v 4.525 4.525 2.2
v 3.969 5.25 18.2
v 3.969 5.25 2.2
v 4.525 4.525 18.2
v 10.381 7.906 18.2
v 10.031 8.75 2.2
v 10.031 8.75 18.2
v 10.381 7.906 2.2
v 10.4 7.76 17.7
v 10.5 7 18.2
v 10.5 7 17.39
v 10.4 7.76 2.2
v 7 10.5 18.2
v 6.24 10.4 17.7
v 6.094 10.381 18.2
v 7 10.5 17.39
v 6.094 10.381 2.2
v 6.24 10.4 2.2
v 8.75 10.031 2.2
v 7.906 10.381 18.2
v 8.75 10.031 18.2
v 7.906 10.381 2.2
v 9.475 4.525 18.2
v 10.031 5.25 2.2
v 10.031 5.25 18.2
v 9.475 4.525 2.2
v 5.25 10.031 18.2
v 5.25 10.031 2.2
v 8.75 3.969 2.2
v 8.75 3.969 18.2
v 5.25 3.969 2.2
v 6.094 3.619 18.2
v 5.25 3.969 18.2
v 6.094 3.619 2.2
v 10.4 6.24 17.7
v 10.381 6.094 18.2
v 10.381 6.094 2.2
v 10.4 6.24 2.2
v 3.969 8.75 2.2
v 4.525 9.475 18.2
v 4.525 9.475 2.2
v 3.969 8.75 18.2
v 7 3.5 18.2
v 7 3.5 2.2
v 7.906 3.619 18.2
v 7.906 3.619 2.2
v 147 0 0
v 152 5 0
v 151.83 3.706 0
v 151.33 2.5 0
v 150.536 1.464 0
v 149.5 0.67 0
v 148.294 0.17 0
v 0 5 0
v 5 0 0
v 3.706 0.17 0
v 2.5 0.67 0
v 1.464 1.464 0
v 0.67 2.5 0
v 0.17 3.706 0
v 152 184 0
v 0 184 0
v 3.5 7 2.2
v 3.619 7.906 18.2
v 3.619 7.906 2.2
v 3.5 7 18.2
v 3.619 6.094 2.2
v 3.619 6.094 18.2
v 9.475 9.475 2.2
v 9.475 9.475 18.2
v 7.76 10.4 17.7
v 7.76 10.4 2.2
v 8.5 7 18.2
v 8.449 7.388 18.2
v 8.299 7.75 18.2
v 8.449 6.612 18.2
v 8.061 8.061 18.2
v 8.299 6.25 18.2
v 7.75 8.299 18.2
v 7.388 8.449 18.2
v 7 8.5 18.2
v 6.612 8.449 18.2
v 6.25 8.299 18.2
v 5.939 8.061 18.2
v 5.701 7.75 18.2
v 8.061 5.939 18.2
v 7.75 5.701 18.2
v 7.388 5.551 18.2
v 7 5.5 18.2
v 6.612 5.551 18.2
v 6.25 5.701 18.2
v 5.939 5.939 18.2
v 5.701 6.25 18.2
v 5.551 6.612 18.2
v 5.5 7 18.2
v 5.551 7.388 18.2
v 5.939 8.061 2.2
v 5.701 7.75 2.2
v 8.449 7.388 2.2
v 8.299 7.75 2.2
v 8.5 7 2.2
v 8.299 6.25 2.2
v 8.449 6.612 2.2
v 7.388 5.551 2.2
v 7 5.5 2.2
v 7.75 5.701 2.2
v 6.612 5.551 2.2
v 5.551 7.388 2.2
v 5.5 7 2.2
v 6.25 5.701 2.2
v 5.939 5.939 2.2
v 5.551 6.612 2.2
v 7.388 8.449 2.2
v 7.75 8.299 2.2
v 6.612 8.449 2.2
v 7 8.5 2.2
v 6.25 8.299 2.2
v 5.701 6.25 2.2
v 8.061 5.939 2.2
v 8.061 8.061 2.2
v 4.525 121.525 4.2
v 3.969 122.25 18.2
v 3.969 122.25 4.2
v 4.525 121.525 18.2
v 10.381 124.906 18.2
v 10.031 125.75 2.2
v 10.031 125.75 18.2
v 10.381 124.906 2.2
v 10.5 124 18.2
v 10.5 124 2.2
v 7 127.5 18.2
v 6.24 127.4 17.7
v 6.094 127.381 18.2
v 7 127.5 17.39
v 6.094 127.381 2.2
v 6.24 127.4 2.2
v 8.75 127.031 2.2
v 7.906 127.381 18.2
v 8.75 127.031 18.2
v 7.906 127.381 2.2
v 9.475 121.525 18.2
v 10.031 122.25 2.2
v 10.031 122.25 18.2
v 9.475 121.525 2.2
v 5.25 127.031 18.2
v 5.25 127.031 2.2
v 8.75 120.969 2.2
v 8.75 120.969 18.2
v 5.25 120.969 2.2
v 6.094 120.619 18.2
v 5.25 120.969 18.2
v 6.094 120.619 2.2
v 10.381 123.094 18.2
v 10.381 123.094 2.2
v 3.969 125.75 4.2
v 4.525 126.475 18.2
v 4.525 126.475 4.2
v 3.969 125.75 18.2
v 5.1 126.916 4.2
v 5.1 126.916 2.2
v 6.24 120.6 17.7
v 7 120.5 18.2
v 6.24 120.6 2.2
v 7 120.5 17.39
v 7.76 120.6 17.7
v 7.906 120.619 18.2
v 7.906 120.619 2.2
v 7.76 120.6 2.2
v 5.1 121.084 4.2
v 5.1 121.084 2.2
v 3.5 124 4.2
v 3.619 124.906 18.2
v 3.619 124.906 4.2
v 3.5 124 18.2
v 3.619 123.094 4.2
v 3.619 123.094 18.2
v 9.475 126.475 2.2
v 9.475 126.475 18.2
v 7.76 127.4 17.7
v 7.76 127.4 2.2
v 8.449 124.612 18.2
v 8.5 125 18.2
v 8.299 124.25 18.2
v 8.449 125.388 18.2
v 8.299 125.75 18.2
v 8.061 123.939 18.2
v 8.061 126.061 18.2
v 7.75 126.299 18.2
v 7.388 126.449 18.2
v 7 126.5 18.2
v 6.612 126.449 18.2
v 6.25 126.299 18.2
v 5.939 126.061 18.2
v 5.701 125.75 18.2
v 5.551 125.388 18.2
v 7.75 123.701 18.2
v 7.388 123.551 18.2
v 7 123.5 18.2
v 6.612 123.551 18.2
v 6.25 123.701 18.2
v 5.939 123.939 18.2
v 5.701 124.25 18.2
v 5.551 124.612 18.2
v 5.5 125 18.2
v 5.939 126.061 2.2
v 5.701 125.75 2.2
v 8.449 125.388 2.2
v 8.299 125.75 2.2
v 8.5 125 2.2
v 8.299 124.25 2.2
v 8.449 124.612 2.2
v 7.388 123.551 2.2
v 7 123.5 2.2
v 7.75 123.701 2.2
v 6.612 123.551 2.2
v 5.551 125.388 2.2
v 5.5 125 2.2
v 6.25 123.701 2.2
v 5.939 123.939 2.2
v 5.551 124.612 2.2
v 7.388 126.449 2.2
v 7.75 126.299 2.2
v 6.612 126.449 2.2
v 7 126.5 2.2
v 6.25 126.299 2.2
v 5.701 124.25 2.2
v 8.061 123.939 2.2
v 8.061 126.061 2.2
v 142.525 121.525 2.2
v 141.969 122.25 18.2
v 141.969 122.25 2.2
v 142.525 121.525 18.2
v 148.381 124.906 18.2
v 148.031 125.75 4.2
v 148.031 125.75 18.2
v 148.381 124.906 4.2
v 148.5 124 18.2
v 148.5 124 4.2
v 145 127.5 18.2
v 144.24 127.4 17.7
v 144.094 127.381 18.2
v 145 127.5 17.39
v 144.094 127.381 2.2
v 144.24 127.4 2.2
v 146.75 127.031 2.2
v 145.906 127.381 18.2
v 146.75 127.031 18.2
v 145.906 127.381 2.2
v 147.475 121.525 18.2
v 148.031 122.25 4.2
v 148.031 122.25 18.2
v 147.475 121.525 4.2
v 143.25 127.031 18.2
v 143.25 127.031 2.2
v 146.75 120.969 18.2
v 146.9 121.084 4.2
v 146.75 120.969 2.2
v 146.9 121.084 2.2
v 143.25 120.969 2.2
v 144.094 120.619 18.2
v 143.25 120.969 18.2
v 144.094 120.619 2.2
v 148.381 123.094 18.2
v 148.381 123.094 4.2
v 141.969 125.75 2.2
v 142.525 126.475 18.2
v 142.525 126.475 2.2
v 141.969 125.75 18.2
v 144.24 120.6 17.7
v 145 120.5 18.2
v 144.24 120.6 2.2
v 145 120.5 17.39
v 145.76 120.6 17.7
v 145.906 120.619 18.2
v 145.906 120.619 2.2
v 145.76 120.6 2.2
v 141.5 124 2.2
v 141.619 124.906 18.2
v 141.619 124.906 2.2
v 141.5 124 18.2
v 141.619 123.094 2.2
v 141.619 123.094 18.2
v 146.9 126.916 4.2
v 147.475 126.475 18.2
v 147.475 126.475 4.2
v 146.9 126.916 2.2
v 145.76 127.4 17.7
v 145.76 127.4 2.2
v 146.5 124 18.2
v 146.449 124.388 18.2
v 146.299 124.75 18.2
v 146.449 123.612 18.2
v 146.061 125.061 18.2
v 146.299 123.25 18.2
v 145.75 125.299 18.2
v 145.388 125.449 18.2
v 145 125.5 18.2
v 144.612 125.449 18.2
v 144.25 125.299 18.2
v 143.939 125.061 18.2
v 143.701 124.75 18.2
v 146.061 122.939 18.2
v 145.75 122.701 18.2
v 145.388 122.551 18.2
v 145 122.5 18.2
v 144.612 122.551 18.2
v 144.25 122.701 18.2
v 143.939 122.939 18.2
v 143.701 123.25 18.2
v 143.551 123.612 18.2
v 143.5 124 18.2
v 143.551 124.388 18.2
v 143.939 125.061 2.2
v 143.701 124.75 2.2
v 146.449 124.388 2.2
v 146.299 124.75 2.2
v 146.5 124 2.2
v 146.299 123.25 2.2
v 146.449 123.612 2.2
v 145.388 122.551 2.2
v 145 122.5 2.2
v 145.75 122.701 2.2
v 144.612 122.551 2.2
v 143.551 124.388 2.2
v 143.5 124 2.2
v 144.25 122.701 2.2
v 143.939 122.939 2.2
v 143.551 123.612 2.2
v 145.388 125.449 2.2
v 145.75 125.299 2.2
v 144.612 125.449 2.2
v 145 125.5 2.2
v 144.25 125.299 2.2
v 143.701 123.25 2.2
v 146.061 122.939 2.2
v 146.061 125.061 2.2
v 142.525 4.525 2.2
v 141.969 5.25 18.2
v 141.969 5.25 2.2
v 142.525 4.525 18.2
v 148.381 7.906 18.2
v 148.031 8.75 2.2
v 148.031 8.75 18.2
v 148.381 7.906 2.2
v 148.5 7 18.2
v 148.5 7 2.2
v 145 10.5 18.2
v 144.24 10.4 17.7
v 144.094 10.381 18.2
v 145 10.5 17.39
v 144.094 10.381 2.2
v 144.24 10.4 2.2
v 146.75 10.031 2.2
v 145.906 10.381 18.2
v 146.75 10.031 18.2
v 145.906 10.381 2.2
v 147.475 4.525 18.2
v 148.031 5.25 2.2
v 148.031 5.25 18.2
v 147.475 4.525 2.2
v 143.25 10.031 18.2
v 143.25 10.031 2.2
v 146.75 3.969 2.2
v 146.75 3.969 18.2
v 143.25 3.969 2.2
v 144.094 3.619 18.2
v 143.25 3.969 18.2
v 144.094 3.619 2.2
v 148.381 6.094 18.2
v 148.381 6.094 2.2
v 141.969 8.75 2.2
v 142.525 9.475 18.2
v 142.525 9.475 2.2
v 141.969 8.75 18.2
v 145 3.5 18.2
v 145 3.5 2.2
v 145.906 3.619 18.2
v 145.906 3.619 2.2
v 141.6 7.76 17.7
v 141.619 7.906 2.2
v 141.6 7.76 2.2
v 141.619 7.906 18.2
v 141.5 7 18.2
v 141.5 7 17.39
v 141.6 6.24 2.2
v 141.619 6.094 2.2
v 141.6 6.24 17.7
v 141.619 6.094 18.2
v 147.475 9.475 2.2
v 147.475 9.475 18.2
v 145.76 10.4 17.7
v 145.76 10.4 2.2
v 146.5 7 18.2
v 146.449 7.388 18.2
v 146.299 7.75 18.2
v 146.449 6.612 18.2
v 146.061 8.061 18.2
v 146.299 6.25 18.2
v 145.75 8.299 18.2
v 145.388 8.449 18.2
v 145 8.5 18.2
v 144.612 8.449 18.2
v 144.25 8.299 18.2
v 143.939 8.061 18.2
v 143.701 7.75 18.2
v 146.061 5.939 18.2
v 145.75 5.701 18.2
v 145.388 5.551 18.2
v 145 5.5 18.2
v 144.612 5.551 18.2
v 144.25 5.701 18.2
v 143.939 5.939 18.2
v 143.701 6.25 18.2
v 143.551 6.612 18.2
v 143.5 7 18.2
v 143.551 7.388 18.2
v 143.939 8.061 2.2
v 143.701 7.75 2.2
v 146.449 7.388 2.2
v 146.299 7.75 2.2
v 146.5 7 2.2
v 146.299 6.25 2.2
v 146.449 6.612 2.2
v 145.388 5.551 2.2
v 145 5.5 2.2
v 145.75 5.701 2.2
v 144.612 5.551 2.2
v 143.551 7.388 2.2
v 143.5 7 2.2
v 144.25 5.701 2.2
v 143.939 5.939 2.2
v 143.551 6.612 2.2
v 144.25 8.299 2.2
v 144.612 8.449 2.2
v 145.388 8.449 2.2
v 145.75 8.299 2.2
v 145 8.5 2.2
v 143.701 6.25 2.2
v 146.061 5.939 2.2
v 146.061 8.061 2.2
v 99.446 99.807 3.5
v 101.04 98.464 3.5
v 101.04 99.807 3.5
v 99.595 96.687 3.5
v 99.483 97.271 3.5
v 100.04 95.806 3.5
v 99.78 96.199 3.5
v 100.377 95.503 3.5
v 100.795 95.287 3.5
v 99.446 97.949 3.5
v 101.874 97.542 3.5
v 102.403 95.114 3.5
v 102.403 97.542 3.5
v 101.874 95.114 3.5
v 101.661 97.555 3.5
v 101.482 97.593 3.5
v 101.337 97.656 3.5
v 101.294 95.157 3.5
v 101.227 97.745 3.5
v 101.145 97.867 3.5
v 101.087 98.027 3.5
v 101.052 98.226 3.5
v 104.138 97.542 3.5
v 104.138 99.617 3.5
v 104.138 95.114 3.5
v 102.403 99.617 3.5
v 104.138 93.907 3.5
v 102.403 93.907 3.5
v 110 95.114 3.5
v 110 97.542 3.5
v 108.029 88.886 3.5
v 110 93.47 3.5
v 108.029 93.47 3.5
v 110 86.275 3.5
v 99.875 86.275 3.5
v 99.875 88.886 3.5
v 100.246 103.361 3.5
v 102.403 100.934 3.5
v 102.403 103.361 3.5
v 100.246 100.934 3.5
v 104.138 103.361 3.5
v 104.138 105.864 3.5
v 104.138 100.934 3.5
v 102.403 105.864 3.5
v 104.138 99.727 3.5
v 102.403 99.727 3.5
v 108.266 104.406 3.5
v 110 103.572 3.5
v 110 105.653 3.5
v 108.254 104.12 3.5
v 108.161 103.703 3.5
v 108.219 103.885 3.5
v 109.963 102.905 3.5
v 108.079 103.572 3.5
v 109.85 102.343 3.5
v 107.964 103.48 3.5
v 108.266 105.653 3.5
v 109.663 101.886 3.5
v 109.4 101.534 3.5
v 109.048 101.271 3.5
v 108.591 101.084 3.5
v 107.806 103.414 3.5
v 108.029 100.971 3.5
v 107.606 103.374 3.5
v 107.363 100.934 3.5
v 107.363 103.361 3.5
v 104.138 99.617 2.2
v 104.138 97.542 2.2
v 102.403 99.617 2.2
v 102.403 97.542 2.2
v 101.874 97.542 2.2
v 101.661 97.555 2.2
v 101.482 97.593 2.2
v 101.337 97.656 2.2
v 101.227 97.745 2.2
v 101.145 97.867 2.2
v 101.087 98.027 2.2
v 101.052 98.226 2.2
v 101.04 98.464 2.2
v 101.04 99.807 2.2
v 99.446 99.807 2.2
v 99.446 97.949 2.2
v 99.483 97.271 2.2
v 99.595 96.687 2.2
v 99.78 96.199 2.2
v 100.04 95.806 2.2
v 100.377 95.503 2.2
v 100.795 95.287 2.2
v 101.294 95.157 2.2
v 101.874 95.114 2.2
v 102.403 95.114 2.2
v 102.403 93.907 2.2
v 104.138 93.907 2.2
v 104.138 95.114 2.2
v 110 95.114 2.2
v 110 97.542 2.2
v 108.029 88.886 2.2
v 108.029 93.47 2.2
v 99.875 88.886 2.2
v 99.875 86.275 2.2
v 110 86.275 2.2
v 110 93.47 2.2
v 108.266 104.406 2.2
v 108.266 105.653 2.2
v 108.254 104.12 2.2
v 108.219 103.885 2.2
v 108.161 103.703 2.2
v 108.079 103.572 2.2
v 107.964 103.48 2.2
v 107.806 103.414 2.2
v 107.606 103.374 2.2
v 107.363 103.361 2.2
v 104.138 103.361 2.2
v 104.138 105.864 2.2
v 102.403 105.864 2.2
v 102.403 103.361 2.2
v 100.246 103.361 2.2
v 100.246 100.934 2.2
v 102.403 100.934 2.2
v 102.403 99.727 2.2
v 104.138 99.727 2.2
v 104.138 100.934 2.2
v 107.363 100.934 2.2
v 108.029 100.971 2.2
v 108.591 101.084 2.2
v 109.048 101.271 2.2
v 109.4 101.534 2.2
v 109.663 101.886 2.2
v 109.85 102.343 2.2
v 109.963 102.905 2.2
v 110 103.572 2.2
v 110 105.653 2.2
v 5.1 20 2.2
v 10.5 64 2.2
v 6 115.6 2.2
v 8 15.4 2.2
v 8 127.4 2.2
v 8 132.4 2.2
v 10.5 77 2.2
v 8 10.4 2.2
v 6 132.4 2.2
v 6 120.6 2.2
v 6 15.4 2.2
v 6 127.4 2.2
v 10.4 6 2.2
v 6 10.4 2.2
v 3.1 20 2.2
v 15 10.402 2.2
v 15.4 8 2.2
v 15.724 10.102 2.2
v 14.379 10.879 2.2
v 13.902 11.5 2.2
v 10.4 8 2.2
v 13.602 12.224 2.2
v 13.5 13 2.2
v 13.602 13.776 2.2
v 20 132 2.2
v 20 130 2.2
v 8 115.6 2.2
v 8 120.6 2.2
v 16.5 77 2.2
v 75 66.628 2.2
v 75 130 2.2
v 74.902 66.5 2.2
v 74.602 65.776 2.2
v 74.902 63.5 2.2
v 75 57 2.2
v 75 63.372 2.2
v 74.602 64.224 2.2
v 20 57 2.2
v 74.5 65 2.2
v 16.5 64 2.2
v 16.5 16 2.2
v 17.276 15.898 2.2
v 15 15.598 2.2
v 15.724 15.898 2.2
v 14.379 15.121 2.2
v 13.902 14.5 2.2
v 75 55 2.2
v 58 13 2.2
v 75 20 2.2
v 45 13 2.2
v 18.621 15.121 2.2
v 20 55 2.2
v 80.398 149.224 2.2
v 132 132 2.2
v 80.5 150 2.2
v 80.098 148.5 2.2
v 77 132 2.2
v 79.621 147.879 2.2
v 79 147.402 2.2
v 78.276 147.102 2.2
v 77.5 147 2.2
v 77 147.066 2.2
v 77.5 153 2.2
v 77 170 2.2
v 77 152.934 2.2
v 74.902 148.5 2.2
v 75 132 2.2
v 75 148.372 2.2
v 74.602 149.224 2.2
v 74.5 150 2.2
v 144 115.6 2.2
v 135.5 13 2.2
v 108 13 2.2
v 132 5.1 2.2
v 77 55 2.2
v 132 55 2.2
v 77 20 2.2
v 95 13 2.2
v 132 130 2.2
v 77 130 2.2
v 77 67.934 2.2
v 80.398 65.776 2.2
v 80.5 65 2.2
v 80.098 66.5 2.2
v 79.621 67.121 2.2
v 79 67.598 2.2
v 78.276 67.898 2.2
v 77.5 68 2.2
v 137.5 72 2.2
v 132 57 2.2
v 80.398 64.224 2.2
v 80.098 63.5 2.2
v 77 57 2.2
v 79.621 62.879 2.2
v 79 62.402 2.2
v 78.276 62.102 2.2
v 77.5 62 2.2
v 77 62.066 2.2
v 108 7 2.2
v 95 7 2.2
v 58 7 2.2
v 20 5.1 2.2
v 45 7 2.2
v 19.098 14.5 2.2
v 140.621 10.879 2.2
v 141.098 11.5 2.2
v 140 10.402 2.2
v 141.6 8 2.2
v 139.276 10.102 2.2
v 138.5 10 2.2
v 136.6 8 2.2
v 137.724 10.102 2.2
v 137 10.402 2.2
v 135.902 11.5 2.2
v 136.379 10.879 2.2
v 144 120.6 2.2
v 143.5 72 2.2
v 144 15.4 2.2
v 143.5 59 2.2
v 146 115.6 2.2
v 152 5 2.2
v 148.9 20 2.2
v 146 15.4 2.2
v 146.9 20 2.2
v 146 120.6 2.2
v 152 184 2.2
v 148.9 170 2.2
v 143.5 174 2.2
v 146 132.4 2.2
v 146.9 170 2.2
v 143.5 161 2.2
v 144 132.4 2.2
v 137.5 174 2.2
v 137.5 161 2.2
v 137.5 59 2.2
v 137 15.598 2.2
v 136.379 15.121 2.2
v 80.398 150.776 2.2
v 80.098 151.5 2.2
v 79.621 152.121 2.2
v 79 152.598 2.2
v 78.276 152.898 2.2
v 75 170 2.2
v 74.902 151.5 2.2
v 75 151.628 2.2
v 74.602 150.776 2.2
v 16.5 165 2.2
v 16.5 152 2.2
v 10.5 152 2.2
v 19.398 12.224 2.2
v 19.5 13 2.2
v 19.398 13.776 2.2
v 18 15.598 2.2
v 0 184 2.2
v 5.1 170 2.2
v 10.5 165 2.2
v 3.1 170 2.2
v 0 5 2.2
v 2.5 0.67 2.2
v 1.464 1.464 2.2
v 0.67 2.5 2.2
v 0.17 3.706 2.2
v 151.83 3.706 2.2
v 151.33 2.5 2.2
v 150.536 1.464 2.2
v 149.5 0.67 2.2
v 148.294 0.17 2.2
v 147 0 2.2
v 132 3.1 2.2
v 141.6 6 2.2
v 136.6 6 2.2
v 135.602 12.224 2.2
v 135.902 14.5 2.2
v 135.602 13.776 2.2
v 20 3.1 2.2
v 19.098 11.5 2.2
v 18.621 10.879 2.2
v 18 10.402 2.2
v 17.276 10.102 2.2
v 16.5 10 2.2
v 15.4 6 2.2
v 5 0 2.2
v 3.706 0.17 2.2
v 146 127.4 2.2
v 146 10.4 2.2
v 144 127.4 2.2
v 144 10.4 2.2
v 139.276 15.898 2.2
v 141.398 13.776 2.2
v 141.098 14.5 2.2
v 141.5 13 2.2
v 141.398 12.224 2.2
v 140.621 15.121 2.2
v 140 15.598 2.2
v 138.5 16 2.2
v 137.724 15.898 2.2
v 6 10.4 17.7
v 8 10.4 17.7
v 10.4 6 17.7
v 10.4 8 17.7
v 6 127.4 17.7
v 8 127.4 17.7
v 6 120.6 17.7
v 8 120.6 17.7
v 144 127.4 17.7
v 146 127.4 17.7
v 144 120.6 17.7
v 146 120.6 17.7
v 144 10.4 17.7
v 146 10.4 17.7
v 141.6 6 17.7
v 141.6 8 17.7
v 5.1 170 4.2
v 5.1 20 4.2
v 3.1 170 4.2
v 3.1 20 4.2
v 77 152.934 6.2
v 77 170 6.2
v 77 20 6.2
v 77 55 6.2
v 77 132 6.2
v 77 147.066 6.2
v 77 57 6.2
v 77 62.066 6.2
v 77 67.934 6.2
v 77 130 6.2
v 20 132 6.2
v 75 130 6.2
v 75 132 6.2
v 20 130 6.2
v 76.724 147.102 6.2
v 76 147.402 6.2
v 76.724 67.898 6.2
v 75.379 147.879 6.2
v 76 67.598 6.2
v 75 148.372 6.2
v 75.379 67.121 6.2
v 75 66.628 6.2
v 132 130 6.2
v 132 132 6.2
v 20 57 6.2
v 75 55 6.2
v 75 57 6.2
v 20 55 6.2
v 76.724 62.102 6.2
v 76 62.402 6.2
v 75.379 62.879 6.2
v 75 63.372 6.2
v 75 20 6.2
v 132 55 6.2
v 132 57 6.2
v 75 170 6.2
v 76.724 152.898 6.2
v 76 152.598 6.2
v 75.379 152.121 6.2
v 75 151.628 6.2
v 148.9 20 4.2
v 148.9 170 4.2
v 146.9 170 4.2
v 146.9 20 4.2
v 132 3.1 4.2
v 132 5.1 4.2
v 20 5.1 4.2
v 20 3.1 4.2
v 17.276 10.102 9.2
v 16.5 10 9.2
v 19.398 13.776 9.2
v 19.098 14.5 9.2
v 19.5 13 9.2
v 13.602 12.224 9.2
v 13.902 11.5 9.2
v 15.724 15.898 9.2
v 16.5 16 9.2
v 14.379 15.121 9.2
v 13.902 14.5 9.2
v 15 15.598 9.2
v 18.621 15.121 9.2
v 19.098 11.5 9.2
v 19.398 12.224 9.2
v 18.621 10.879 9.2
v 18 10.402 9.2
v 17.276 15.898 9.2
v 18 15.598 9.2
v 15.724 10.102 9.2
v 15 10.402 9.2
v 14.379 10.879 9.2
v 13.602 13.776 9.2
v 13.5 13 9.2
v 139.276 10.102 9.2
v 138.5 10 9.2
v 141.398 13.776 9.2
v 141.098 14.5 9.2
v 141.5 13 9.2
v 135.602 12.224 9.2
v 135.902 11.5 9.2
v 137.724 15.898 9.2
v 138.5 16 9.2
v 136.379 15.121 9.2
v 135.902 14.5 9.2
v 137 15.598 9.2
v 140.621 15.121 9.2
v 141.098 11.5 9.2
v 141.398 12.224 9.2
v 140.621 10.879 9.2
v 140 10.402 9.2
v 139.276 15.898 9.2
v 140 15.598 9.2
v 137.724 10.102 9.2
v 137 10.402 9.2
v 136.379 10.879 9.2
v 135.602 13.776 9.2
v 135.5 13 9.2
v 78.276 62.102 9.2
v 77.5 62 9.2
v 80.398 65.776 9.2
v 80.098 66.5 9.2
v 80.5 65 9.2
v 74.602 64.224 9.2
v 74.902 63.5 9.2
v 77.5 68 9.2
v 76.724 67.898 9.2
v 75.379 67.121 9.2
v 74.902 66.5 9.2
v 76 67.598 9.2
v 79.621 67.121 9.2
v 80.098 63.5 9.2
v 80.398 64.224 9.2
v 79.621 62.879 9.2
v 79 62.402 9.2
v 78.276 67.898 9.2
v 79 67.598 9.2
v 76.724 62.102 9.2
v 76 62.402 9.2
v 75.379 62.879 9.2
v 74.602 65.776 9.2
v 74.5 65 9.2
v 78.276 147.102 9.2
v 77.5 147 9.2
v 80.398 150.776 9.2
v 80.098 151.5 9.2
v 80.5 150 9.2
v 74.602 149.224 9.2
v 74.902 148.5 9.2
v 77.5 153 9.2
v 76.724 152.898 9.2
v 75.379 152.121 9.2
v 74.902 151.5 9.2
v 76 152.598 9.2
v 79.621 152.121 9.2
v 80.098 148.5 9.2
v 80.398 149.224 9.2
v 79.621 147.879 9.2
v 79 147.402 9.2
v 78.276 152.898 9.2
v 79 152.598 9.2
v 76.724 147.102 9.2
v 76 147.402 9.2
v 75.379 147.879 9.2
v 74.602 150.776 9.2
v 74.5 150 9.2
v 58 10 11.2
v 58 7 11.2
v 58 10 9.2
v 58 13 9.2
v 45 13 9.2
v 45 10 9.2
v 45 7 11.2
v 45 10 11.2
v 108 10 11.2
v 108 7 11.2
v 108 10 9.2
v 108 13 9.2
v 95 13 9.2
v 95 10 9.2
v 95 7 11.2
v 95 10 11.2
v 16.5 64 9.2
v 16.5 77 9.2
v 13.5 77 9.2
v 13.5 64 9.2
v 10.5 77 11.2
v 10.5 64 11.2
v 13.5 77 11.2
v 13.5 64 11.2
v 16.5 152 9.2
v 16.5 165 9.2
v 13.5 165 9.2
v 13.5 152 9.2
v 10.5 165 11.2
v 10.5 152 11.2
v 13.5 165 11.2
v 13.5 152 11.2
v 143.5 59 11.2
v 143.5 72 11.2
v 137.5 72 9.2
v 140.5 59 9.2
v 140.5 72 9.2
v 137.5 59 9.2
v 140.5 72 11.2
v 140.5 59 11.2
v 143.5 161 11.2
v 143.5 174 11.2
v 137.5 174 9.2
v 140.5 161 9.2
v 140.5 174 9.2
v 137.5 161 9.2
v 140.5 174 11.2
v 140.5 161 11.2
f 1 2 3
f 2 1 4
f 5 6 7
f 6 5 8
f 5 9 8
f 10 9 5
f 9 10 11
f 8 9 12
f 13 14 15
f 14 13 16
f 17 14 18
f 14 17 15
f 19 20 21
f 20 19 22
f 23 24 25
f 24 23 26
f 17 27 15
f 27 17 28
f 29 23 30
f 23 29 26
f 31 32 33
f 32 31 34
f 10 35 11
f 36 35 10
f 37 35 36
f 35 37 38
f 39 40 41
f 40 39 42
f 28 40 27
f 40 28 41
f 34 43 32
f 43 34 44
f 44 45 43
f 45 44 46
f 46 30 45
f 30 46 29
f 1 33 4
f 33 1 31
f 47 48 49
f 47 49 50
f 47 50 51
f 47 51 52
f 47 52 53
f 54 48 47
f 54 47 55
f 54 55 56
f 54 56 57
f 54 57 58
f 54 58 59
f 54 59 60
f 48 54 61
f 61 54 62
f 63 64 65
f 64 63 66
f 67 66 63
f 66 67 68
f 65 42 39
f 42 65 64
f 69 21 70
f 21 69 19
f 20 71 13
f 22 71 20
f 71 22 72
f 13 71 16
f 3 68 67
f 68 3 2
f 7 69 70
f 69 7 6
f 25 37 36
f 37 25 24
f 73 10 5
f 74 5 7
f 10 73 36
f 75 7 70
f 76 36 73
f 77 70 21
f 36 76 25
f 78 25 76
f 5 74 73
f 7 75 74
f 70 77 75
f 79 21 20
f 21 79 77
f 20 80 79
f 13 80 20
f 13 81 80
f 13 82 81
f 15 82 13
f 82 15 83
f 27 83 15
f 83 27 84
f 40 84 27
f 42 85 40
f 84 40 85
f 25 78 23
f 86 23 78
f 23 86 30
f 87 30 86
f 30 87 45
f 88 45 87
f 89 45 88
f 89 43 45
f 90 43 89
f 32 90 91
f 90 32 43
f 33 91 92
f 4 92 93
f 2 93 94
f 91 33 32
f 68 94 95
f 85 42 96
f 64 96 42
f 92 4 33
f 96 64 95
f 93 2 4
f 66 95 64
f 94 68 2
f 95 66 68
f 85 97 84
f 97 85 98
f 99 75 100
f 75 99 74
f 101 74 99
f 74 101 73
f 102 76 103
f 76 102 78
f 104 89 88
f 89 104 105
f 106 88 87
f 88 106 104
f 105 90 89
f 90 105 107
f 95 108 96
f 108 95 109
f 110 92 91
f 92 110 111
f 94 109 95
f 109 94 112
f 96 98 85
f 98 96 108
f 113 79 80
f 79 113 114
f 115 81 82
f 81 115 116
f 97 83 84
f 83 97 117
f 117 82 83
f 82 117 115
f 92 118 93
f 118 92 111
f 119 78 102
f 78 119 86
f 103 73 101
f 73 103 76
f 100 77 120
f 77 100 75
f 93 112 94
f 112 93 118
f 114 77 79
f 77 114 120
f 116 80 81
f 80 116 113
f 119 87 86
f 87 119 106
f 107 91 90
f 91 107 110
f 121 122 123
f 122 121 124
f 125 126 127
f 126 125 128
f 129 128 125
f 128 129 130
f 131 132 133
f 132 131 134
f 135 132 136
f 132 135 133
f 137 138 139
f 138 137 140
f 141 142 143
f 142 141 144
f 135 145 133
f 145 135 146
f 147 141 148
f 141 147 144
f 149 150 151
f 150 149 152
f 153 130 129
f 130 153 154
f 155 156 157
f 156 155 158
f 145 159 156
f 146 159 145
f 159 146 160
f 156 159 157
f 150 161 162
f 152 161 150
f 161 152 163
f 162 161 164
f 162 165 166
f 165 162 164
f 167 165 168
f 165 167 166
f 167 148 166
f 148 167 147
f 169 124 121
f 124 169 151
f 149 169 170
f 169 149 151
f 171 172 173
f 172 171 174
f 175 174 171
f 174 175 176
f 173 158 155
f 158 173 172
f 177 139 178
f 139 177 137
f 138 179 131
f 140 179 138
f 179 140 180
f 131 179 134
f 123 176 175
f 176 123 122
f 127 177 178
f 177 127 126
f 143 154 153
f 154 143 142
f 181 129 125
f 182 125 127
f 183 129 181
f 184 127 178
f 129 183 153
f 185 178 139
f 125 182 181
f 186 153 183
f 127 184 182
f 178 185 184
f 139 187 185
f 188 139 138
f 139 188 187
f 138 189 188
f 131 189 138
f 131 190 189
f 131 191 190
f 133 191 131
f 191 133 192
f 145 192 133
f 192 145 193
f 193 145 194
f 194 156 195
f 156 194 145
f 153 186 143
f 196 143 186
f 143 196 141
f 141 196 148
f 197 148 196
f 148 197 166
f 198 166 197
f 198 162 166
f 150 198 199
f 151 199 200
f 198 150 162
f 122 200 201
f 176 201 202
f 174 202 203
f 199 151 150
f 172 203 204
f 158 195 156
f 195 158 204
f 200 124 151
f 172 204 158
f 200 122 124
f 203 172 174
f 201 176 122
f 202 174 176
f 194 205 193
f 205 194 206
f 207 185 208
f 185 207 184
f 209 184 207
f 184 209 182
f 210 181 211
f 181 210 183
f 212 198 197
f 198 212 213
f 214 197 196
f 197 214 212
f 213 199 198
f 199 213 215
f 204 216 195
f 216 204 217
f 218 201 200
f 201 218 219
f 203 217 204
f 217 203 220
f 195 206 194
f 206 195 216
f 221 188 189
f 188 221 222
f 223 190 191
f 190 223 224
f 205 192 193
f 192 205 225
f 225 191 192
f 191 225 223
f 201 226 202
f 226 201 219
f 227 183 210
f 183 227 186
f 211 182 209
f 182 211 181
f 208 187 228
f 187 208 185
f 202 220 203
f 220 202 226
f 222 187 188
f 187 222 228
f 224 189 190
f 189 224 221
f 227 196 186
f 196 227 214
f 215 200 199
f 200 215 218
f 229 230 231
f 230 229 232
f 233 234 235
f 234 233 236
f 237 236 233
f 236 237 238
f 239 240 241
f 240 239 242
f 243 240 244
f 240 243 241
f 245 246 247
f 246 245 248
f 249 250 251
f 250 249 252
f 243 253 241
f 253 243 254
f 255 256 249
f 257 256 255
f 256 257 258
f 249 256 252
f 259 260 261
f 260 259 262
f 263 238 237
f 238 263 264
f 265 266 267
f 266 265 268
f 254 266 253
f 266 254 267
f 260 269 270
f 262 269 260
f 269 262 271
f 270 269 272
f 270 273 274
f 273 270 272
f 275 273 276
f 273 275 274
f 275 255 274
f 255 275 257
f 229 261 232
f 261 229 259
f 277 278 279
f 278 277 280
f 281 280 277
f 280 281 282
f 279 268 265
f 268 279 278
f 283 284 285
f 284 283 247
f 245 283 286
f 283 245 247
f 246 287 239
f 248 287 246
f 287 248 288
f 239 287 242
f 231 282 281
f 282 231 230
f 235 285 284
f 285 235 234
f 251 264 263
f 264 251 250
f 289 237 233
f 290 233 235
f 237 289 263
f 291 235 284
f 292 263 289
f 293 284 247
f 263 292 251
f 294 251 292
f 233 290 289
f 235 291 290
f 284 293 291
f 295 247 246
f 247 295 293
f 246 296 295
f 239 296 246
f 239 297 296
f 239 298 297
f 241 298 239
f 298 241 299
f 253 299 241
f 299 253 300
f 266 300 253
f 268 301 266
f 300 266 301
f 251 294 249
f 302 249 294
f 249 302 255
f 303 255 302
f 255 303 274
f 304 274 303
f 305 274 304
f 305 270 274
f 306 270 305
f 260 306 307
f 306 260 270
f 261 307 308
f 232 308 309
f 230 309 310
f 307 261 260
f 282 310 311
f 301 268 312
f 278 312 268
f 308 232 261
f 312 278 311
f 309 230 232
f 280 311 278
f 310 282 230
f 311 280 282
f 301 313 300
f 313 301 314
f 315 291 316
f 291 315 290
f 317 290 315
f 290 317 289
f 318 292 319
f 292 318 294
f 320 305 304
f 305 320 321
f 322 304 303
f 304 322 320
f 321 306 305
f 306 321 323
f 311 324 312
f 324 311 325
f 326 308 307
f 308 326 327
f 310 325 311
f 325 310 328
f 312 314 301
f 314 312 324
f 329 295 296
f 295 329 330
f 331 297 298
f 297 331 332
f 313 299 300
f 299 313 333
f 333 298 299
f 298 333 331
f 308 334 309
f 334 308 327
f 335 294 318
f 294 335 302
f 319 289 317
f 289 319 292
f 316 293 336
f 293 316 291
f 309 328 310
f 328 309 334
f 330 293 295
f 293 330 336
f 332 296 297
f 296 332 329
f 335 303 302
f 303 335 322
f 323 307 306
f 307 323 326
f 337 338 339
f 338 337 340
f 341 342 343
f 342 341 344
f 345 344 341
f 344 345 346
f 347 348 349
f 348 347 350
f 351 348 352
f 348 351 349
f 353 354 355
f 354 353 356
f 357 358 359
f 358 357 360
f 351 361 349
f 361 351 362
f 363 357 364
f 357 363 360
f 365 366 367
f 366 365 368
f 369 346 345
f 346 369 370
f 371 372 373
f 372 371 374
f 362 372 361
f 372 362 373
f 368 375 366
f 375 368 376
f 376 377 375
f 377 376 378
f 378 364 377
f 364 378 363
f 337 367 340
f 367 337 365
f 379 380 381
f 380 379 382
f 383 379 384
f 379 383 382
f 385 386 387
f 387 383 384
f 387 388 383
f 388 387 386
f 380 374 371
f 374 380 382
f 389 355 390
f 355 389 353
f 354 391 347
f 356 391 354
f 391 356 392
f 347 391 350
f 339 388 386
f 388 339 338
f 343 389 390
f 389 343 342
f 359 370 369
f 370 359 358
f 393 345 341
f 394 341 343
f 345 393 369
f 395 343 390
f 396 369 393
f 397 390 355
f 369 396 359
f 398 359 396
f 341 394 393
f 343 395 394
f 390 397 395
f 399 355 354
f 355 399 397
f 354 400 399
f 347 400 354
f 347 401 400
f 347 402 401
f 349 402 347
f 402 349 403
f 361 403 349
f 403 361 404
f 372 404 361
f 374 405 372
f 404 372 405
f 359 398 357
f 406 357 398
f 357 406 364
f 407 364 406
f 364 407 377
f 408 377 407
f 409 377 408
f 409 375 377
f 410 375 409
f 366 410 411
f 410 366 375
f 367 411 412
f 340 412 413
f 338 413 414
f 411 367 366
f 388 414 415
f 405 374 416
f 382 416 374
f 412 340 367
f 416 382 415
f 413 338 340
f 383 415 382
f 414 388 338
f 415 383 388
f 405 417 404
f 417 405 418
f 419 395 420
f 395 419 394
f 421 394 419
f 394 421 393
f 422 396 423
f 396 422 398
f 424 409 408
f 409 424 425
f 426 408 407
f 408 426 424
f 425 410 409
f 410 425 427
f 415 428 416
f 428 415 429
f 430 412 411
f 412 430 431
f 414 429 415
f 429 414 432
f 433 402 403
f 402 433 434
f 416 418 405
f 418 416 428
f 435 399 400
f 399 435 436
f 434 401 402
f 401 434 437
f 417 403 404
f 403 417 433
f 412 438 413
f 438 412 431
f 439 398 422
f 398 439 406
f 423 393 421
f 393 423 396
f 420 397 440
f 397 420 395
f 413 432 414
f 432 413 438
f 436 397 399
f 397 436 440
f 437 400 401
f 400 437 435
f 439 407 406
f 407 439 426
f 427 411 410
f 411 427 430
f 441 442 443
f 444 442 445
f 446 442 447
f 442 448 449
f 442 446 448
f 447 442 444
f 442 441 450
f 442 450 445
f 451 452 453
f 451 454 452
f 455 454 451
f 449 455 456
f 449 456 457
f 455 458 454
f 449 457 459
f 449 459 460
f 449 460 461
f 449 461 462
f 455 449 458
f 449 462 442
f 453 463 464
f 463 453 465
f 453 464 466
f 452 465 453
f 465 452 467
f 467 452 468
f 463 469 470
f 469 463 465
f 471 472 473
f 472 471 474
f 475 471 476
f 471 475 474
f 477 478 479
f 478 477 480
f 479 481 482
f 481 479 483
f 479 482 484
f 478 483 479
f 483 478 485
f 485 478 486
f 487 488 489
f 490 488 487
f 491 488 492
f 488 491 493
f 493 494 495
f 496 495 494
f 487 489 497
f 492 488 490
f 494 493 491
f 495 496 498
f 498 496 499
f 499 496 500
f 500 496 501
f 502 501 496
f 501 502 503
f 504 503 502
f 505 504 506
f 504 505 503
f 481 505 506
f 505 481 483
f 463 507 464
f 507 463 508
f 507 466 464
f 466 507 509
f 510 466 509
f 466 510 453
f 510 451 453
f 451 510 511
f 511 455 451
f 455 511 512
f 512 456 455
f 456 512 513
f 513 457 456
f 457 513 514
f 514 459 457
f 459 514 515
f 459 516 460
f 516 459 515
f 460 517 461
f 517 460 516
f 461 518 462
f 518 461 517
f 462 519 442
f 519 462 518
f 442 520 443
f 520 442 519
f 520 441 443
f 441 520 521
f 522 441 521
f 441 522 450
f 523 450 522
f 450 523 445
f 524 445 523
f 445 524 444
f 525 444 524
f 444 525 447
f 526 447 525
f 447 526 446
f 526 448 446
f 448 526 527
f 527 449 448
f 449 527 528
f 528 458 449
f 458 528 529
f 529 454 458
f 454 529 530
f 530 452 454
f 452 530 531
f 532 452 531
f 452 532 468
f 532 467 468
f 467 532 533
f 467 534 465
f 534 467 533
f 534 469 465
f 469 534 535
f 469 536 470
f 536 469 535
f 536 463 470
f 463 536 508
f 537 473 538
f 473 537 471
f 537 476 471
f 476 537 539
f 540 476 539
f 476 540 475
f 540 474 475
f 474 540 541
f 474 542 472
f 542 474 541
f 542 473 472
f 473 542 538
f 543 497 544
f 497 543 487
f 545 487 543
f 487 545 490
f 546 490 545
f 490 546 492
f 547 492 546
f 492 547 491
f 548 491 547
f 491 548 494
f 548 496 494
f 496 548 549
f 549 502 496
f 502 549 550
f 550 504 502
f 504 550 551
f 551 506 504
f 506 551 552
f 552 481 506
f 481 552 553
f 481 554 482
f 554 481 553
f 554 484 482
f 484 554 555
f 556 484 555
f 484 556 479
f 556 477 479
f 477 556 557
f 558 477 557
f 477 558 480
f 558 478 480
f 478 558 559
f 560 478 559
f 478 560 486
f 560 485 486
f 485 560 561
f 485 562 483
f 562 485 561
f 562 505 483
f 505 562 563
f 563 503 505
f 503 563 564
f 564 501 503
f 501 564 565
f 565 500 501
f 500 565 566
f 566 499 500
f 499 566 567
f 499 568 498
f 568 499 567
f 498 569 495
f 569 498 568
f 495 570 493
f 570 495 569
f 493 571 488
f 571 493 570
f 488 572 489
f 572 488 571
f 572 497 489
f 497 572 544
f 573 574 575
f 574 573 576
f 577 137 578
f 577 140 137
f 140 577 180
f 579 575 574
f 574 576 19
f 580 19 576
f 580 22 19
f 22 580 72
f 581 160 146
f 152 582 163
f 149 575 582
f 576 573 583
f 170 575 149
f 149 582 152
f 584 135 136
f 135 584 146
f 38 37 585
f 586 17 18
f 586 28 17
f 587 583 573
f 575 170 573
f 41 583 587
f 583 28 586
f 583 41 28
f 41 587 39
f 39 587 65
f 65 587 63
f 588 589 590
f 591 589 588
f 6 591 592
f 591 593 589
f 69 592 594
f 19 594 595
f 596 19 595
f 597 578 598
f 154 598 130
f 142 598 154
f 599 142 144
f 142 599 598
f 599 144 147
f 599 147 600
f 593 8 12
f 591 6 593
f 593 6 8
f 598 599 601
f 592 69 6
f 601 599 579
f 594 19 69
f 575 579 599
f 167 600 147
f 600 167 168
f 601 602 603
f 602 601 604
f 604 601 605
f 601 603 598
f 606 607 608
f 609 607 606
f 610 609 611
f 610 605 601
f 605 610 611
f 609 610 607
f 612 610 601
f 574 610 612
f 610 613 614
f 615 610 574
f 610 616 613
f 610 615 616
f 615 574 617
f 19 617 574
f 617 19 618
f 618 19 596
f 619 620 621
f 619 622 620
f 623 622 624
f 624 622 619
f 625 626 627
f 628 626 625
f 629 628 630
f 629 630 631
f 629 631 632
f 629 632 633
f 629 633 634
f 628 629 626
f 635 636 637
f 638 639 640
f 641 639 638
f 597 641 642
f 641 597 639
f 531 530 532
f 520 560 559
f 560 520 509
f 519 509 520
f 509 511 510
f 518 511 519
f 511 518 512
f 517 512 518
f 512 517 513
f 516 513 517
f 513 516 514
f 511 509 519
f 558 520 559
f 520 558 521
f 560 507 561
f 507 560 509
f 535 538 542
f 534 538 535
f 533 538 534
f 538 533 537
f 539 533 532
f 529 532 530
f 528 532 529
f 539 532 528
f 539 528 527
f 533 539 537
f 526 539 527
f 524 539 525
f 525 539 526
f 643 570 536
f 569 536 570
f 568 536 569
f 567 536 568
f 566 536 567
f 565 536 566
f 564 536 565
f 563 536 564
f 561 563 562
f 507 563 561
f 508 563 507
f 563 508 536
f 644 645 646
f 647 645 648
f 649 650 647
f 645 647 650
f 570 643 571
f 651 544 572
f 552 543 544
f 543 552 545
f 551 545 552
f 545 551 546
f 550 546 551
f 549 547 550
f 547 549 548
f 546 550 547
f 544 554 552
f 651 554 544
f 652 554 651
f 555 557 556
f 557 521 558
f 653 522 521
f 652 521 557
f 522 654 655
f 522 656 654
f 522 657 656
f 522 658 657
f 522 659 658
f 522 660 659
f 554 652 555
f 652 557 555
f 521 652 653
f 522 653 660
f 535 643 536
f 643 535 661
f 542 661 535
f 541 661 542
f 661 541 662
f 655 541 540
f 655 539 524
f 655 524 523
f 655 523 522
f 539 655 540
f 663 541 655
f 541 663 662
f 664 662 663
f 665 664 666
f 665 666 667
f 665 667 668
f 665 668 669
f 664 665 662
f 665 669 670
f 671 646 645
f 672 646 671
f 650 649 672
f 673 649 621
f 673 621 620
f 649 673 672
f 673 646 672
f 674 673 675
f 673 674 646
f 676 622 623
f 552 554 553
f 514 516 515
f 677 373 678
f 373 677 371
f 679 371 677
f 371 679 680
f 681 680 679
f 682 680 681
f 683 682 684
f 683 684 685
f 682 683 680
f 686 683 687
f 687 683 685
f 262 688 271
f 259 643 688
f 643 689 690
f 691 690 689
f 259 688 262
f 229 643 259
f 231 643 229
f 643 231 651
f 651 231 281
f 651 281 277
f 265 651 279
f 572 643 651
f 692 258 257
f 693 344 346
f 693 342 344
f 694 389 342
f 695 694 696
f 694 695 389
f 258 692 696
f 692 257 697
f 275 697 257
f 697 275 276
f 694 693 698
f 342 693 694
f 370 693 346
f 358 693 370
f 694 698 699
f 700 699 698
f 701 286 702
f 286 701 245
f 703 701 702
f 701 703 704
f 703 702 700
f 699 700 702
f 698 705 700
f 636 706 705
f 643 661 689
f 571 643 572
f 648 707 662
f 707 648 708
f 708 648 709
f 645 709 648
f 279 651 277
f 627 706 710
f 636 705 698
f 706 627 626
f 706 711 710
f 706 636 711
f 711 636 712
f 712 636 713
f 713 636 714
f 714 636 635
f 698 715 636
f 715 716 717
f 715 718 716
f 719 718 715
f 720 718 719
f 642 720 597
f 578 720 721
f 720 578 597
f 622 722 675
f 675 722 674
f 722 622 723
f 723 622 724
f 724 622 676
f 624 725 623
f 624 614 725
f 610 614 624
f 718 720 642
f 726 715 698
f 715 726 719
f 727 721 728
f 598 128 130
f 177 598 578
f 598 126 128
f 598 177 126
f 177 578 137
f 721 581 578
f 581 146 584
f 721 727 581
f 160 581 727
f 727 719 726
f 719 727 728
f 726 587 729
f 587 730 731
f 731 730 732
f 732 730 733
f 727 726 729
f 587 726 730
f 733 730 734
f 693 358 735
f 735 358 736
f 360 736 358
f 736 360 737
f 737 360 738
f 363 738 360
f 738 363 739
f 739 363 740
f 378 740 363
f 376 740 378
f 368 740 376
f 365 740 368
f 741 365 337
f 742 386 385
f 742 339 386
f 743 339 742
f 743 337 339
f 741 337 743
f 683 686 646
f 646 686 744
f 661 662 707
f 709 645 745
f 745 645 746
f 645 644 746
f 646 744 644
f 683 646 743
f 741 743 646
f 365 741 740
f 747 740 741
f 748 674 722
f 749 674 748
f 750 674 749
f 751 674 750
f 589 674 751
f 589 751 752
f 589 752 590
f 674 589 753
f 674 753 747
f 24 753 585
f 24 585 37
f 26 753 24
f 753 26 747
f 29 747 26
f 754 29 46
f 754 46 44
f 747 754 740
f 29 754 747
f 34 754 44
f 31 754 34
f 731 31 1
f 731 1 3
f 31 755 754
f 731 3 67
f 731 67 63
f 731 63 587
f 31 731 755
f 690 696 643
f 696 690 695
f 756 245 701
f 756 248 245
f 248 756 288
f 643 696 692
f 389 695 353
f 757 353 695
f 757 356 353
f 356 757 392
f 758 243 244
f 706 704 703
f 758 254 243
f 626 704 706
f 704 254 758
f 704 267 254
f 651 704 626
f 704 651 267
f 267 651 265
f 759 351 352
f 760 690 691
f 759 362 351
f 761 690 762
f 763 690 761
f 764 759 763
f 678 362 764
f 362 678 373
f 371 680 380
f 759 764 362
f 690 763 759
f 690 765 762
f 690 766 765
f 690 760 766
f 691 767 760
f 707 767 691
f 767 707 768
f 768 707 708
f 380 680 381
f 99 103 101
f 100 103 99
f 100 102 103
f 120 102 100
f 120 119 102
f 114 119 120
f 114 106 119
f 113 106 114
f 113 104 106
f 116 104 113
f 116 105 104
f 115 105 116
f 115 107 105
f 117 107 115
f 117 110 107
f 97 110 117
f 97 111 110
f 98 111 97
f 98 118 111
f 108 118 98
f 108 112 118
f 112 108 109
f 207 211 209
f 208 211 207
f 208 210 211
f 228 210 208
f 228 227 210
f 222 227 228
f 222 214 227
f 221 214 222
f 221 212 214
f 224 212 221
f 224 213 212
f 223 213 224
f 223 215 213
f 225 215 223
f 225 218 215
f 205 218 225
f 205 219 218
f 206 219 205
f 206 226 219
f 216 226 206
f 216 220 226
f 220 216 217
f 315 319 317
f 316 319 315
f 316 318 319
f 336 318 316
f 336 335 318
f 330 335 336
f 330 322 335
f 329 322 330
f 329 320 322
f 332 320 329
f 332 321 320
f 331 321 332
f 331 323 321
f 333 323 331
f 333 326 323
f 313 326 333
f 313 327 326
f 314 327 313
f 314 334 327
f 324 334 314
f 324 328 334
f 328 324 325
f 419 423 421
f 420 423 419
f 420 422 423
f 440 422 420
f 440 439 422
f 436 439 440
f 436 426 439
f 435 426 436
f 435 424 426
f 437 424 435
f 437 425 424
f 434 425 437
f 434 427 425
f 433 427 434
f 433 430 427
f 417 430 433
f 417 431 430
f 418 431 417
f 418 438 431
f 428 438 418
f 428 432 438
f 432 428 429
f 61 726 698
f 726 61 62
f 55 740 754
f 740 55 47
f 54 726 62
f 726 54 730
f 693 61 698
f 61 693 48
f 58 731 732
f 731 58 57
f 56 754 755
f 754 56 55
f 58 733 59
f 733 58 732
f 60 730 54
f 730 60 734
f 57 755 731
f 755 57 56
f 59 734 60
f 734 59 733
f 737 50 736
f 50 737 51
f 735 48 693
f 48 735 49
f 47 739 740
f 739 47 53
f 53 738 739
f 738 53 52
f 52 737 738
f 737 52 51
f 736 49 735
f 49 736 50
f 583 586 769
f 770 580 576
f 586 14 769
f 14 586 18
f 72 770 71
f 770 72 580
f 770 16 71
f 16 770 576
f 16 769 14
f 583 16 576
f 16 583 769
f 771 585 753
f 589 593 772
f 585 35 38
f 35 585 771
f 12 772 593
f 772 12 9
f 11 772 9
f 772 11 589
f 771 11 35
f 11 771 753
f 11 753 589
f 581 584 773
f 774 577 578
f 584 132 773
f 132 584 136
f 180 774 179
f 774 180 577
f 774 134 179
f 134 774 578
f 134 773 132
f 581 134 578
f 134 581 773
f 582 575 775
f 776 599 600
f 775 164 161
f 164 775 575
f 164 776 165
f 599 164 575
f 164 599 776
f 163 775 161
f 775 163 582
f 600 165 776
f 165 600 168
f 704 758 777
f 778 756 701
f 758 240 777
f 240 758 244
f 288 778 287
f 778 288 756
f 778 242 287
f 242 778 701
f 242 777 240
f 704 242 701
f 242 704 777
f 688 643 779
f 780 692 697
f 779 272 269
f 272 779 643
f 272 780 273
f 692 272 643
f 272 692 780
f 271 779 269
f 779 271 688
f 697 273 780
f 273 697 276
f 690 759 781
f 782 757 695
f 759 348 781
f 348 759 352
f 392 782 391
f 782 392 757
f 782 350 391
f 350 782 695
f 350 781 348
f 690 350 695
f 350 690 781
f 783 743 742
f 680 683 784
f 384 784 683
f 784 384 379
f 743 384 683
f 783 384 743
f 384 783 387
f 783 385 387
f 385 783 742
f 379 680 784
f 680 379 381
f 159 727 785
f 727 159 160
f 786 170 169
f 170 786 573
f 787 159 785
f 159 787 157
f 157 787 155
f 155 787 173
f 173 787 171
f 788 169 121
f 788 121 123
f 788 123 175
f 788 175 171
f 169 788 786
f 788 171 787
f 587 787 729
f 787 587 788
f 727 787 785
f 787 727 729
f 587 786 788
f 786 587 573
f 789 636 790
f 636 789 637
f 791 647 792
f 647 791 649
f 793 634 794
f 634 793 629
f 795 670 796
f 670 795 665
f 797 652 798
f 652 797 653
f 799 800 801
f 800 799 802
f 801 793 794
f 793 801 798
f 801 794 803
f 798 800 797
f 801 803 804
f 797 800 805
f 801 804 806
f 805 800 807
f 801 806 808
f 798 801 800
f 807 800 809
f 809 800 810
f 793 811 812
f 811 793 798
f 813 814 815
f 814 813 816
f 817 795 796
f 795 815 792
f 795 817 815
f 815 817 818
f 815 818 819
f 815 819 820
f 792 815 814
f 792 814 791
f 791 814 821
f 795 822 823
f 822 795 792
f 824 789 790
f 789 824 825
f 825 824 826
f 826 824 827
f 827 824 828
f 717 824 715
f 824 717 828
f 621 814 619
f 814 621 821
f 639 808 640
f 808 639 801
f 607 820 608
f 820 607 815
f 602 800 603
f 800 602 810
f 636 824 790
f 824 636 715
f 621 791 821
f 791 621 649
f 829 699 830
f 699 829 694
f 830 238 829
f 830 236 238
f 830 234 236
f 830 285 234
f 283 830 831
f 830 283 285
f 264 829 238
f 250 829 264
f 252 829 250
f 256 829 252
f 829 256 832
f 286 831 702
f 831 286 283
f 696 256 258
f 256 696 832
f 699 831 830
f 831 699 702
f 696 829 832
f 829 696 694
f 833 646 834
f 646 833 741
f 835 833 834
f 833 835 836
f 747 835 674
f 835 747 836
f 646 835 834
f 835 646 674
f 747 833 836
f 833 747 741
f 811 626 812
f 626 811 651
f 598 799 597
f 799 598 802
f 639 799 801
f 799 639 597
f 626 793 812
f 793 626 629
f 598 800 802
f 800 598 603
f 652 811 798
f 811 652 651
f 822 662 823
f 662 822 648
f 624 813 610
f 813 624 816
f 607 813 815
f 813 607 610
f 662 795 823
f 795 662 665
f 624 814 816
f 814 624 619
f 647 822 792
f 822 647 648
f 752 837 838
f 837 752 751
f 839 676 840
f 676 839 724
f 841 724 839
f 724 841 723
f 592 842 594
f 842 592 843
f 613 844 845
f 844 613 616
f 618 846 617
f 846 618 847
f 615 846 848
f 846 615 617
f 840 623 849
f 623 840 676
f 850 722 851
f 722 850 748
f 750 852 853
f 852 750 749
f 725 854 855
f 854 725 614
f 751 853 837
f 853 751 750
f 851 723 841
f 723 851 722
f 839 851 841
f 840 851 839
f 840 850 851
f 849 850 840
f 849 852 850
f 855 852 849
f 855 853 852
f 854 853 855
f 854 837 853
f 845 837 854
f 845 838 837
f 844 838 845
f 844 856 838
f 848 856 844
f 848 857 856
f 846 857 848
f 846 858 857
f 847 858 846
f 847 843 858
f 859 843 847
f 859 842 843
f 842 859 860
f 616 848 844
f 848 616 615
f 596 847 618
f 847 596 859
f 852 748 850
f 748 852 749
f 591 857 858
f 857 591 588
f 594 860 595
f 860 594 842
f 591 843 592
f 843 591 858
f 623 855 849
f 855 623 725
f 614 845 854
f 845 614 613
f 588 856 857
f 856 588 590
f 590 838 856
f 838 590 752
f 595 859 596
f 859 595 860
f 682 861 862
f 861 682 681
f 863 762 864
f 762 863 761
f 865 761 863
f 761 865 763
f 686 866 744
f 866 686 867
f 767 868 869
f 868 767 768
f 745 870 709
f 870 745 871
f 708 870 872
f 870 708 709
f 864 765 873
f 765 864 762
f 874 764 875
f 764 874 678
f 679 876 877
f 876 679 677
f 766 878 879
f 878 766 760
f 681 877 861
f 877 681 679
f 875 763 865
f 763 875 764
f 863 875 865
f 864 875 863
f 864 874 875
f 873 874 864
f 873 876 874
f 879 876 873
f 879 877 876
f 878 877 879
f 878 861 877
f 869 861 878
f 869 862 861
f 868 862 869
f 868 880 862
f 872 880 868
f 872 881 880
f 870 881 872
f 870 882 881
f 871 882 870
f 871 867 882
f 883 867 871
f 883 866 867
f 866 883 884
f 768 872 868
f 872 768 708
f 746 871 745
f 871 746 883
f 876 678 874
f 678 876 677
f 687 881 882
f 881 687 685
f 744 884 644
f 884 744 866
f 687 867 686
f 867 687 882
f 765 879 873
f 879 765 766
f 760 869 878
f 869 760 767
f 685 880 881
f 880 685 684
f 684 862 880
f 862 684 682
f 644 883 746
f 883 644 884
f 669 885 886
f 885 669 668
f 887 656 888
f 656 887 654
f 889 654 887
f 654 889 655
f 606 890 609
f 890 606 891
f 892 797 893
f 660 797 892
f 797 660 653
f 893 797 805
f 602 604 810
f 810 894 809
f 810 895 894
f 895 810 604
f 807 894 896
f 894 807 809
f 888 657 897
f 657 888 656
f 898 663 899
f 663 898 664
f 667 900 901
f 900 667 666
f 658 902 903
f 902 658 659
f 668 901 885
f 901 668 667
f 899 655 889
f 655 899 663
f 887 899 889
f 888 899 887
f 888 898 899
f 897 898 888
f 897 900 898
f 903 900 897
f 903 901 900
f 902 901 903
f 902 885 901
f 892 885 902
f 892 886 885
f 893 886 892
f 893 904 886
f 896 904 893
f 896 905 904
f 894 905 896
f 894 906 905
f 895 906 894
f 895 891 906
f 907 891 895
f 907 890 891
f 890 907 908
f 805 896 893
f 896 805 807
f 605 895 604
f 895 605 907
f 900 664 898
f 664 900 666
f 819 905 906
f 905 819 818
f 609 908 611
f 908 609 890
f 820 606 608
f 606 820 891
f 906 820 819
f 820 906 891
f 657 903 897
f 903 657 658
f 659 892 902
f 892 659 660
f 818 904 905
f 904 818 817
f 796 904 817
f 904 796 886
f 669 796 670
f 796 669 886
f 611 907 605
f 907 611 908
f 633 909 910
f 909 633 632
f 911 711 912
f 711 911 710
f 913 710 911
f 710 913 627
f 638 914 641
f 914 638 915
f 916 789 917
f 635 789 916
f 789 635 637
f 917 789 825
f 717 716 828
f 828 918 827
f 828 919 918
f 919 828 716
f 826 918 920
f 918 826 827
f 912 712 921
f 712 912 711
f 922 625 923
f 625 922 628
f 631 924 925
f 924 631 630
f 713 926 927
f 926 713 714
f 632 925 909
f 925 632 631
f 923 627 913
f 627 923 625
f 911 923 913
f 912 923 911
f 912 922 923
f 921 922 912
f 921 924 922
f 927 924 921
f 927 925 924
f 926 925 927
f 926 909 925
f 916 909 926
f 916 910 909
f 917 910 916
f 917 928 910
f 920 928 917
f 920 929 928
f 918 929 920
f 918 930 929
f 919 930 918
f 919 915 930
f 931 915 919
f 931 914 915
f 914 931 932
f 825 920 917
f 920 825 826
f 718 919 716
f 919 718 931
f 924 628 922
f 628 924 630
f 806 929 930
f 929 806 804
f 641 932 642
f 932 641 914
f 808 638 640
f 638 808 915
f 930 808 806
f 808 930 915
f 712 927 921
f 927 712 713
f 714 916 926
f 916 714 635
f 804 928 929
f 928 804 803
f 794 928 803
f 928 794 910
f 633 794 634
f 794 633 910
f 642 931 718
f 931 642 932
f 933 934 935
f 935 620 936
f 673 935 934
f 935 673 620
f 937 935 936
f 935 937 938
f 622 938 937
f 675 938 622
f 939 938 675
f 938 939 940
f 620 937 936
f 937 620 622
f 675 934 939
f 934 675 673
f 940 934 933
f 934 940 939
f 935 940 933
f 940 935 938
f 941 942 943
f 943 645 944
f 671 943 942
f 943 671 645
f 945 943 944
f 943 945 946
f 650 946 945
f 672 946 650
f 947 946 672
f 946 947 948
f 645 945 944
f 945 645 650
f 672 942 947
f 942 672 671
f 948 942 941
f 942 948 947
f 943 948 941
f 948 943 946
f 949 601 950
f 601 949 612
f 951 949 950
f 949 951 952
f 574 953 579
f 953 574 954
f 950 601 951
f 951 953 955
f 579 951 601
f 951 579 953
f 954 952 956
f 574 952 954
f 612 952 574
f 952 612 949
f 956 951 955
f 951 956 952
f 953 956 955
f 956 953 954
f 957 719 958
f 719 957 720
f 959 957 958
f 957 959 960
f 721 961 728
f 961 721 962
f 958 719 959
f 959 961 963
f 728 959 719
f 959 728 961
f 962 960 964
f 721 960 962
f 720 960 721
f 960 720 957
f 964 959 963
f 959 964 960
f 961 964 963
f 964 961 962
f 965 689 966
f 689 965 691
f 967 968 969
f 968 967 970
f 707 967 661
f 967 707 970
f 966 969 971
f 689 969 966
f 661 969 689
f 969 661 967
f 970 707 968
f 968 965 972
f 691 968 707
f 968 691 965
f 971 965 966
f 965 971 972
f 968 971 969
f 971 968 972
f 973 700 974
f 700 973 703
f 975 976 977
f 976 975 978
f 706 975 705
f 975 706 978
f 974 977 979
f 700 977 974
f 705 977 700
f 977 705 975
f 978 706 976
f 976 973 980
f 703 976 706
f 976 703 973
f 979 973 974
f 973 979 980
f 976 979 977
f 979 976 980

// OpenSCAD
//TXT
translate([110,85,0])
rotate([0,0,90])
linear_extrude(3.5)
text("Lft",size=10,font="Open Sans:style=bold");
//BASE
$fn=24;
translate([5,5,0])
    cube([142,179,2.2]);
translate([5,0,0])
    cube([142,5,2.2]);
translate([0,5,0])
    cube([5,179,2.2]);
translate([147,5,0])
    cube([5,179,2.2]);    
translate([5,5,0])
    cylinder(h=2.2,r1=5,r2=5);
translate([147,5,0])
    cylinder(h=2.2,r1=5,r2=5);
//TOWER0
difference()
{
    translate([7,7,0])
        cylinder(h=18.2,r1=3.5,r2=3.5);
    translate([7,7,-1])
        cylinder(d=3,h=20);
}
//Trigon0Y
translate([6,10.4,2.2])
    {TrigonPoints = [
    [0,0,0],//0
    [0,5,0],//1
    [0,0,15.5],//2
    [2,0,0],//3
    [2,5,0],//4
    [2,0,15.5]];//5
    TrigonFaces = [
    [0,1,2],//outside
    [0,3,4,1],//bottom
    [0,2,5,3],//top    
    [2,1,4,5],//back
    [3,5,4]];//inside
polyhedron(TrigonPoints,TrigonFaces);}
//Trigon0Yright
translate([10.4,6,2.2])
    {TrigonPoints = [
    [0,0,0],//0
    [5,0,0],//1
    [0,0,15.5],//2
    [0,2,0],//3
    [5,2,0],//4
    [0,2,15.5]]; //5
    TrigonFaces = [
    [0,2,1],//outside
    [0,1,4,3],//bottom
    [0,3,5,2],//top
    [1,2,5,4],//back
    [3,4,5]];//inside
polyhedron(TrigonPoints,TrigonFaces);}//
//
//TOWER1
difference()
{
    translate([7,124,0])
        cylinder(h=18.2,r1=3.5,r2=3.5);
    translate([7,125,-1])
        cylinder(d=3,h=20);
}
//Trigon1Y
translate([6,127.4,2.2])
    {TrigonPoints = [
    [0,0,0],//0
    [0,5,0],//1
    [0,0,15.5],//2
    [2,0,0],//3
    [2,5,0],//4
    [2,0,15.5]];//5
    TrigonFaces = [
    [0,1,2],//outside
    [0,3,4,1],//bottom
    [0,2,5,3],//top
    [2,1,4,5],//back
    [3,5,4]];//inside
polyhedron(TrigonPoints,TrigonFaces);}
//Trigon1Yrev
translate([6,115.6,2.2])
    {TrigonPoints = [
    [0,0,0],//0
    [0,5,0],//1
    [0,5,15.5],//2
    [2,0,0],//3
    [2,5,0],//4
    [2,5,15.5]]; //5
    TrigonFaces = [
    [0,1,2],//outside
    [0,3,4,1],//bottom
    [0,2,5,3],//top
    [1,4,5,2],//back
    [3,5,4]];//inside
polyhedron(TrigonPoints,TrigonFaces);}
//
//TOWER2
difference()
{
    translate([145,124,0])
        cylinder(h=18.2,r1=3.5,r2=3.5);
    translate([145,124,-1])
        cylinder(d=3,h=20);
}
//Trigon2Y
translate([144,127.4,2.2])
    {TrigonPoints = [
    [0,0,0],//0
    [0,5,0],//1
    [0,0,15.5],//2
    [2,0,0],//3
    [2,5,0],//4
    [2,0,15.5]]; //5
    TrigonFaces = [
    [0,1,2],//outside
    [0,3,4,1],//bottom
    [0,2,5,3],//top
    [2,1,4,5],//back
    [3,5,4]];//inside
polyhedron(TrigonPoints,TrigonFaces);}
//Trigon2Yrev
translate([144,115.6,2.2])
    {TrigonPoints = [
    [0,0,0],//0
    [0,5,0],//1
    [0,5,15.5],//2
    [2,0,0],//3
    [2,5,0],//4
    [2,5,15.5]]; //5
    TrigonFaces = [
    [0,1,2],//outside
    [0,3,4,1],//bottom
    [0,2,5,3],//top
    [1,4,5,2],//back
    [3,5,4]];//inside
polyhedron(TrigonPoints,TrigonFaces);}
//
//TOWER3
difference()
{
    translate([145,7,0])
        cylinder(h=18.2,r1=3.5,r2=3.5);
    translate([145,7,-1])
        cylinder(d=3,h=20);
}
//Trigon3Y
translate([144,10.4,2.2])
    {TrigonPoints = [
    [0,0,0],//0
    [0,5,0],//1
    [0,0,15.5],//2
    [2,0,0],//3
    [2,5,0],//4
    [2,0,15.5]]; //5
    TrigonFaces = [
    [0,1,2],//outside
    [0,3,4,1],//bottom
    [0,2,5,3],//top
    [2,1,4,5],//back
    [3,5,4]];//inside
polyhedron(TrigonPoints,TrigonFaces);}
//Trigon3Yleft
translate([136.6,6,2.2])
    {TrigonPoints = [
    [0,0,0],//0
    [5,0,0],//1
    [5,0,15.5],//2
    [0,2,0],//3
    [5,2,0],//4
    [5,2,15.5]]; //5
    TrigonFaces = [
    [0,2,1],//outside
    [0,1,4,3],//bottom
    [0,3,5,2],//top
    [1,2,5,4],//back
    [3,4,5]];//inside
polyhedron(TrigonPoints,TrigonFaces);}
//Ribs
translate([3.1,20,2.2])
    cube([2,150,2]);
translate([75,20,2.2])
    cube([2,150,4]);
translate([146.9,20,2.2])
    cube([2,150,2]);
translate([20,3.1,2.2])
    cube([112,2,2]);
translate([20,130,2.2])
    cube([112,2,4]);
translate([20,55,2.2])
    cube([112,2,4]);
//Corner and Mid Supports
translate([16.5,13,2.2])
    cylinder(h=7,r1=3,r2=3);
translate([138.5,13,2.2])
    cylinder(h=7,r1=3,r2=3);
translate([77.5,65,2.2])
    cylinder(h=7,r1=3,r2=3);
translate([77.5,150,2.2])
    cylinder(h=7,r1=3,r2=3);
//PCB Side
translate([45,7,2.2])
    cube([13,6,7]);
translate([45,7,9.2])
    cube([13,3,2]);
translate([95,7,2.2])
    cube([13,6,7]);
translate([95,7,9.2])
    cube([13,3,2]);
//PCB Top Left
translate([10.5,64,2.2])
    cube([6,13,7]);
translate([10.5,64,9.2])
    cube([3,13,2]);
translate([10.5,152,2.2])
    cube([6,13,7]);
translate([10.5,152,9.2])
    cube([3,13,2]);
//PCB Bottom Left
translate([137.5,59,2.2])
    cube([6,13,7]);
translate([140.5,59,9.2])
    cube([3,13,2]);
translate([137.5,161,2.2])
    cube([6,13,7]);
translate([140.5,161,9.2])
    cube([3,13,2]);
